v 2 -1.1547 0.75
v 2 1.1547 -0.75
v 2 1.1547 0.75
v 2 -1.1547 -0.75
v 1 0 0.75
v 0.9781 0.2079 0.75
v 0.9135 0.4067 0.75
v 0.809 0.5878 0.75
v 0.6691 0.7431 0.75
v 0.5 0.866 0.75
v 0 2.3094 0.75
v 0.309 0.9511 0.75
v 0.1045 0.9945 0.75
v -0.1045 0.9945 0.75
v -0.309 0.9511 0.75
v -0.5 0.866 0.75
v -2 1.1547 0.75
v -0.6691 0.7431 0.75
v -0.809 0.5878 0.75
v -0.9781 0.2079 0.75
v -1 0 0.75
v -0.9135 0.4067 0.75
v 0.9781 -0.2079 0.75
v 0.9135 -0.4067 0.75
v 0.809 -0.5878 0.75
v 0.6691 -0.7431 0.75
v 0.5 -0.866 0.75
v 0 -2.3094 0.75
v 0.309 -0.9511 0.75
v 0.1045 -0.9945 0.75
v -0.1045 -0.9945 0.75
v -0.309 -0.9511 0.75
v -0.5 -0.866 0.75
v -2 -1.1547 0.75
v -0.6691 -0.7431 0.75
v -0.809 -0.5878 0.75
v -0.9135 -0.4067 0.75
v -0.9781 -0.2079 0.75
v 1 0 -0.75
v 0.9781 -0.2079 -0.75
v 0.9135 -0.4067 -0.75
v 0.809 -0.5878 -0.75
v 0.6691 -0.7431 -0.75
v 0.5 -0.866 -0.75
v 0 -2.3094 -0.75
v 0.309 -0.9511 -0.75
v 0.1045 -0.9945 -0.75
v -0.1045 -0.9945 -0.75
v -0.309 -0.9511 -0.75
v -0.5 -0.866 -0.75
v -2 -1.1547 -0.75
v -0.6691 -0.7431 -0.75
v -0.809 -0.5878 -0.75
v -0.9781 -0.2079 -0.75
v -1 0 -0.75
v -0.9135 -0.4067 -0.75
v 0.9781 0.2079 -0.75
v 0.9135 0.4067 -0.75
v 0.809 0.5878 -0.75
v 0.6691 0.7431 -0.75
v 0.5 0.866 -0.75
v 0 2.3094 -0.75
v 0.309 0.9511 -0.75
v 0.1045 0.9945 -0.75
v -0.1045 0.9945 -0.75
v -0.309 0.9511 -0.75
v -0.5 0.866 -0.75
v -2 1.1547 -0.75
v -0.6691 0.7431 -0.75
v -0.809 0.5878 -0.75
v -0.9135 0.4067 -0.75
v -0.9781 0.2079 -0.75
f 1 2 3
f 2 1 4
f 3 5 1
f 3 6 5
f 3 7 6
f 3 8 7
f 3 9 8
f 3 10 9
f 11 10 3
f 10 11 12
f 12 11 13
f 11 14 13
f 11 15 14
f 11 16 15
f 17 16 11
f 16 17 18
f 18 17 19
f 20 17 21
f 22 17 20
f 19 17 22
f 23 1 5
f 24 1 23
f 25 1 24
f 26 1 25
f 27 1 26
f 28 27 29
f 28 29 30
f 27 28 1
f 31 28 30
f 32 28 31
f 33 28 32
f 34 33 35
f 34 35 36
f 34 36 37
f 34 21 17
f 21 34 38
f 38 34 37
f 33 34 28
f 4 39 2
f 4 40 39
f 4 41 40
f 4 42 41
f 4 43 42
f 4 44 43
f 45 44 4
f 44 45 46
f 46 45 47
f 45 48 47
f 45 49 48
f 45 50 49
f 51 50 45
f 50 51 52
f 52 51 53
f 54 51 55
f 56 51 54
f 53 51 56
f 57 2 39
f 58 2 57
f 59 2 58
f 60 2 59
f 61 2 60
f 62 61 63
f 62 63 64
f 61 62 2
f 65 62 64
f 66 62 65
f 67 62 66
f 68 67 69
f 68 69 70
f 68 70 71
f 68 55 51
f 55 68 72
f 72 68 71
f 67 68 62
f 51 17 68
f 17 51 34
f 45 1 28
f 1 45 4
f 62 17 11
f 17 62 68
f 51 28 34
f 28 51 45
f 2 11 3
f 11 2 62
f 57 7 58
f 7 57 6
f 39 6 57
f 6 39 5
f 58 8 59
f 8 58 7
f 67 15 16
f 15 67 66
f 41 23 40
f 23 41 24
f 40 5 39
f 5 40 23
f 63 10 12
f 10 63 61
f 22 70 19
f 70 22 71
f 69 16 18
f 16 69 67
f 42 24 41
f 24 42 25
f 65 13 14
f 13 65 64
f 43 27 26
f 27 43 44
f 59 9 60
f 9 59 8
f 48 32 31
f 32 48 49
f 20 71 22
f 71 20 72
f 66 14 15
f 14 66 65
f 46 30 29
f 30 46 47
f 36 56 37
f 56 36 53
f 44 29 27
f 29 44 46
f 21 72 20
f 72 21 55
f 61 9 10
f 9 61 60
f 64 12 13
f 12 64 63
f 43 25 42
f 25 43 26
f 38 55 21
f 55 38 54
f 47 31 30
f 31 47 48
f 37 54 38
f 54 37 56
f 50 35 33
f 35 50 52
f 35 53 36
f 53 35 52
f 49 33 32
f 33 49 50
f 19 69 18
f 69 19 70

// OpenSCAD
// file: settings.scad
// Common settings used by all scad files.

// ALL UNITS IN MILLIMETERS (MM)!!!

$fn = 30;//low-res but fast to render
//$fn = 50;//higher-res but slow to render

pi = 3.1415926535897932384626433832795;

max_footprint = 150; // 15x15 cm

bottom_clearance = 10;
bottom_clearance = 25.4/2+10;
//bottom_clearance = 30;

shell_alpha = 0.215;
//shell_alpha = 1.0;

tolerance = 0.5;

// Flat countersunk M2.5mm x 0.45mm machine screw.
screw_thread_diameter = 2.5;//2.8;//2.75;//2.4?
screw_thread_length = 5;//?
screw_head_diameter = 4.75; // M2.5
//screw_head_diameter = 5.2; // M3
screw_head_height = 1.5;//2;

screw_thread_diameter2 = 2;

unit_thickness = 5;
u = unit_thickness;

shell_thickness = unit_thickness;

// Show flags.
show_platform = 0;
show_head = 1;
show_head_shell = 0;
show_head_electronics_bb = 0;
show_battery = 1;
show_foot_cube = 0;
show_torso = 0;
show_motor = 0;
show_motor_plates = 1;
show_motor_inner_plates = 1;
show_motor_outer_plates = 1;
show_wheel = 0;//obsolete
show_tracks = 1;//
show_track_wheels = 1;
show_caster = 0;
show_rpi = 1;
show_vertical_plates = 1;//
show_horizontal_plates = 1;//
show_caster_plates = 0;//obsolete?
show_camera = 1;
show_screen = 0;
show_edge_mount = 1;
show_sonar_mount = 1;
show_recharge_mount = 1;
show_conduit = 1;
show_torso_shell = 1;
show_recharge_dock = 0;
show_head_tilt_axis = 0;
show_rpi_camera_axis = 0;
show_laser_axis = 0;

head_vertical_angle_tilt = 0;
//head_vertical_angle_tilt = 30;//max
//head_vertical_angle_tilt = 10;

torso_height = 120+20;

base_plate_diameter = max_footprint-unit_thickness*2;
base_plate_frame = 0;

head_height = 50;
head_offset_z = max_footprint/2;
head_middle_cutout = 85;

rpi_with_four_hats_and_clearance = 76;

qrd1114_w = 6.10;
qrd1114_l = 4.39;
qrd1114_h = 4.65;

dock_radius = 10;
dock_gripper_border = 2;
dock_gripper_instep = 0.9;
dock_gripper_cutout_tapper = 50;
dock_receiver_height = 5;

// Patriod Fuel+ 9000 mAh
battery_length = 90;
battery_width = 57;
battery_height = 23;
battery_offset_z = 30;//4;

wheel_diameter = 50;
wheel_offset_x = 65;
wheel_offset_z = wheel_diameter/2;
wheel_axle_diameter = 5;

//caster_diameter = 19.05; // 0.75 inches
caster_diameter = 25.45; // 1 inches
//caster_diameter = 15.875; // 5/8 inches
caster_holder_diameter = 30;//31;
caster_offset_y = base_plate_diameter/2 - caster_holder_diameter/2;

arduino_offset_x = 0;
arduino_offset_y = 0;
arduino_offset_z = 67;
arduino_offset_x2 = 0;
arduino_offset_y2 = -20;
arduino_offset_z2 = torso_height+bottom_clearance;

horizontal_plate_width = unit_thickness*8*2 - unit_thickness*2;
horizontal_plate_depth = unit_thickness*8*2;

vertical_plate_width = horizontal_plate_depth;
vertical_plate_height = unit_thickness*8;
vertical_plate_offset_x = wheel_offset_x-22.5;
vertical_plate_offset_z = vertical_plate_height/2 + unit_thickness/2;

vertical_battery_plate_height = 100 - 15;

caster_plate_width = horizontal_plate_width + unit_thickness*2;
caster_plate_mount_length = unit_thickness*4;
caster_plate_width_minor = caster_holder_diameter;

motor_switch_length = 20;
motor_switch_thickness = 6.5;
motor_switch_height = 11;
motor_switch_height_leads = 23;
motor_switch_on_height =  13.3;
motor_switch_hole_diameter = 2.5;
motor_switch_hole_offset_z = 6.5;//this plus diameter/2 is hole center from switch top
motor_switch_hole_spacing = 7.1;// holes are diameter/2 from this

motor_length = 60;
motor_width = 25;
motor_collar_width = 7;
motor_collar_height = 2.5;
motor_axle_width = 4;
motor_axle_height = 9.5;
motor_offset_x = 10;
//motor_offset_y = motor_width/2+5;
motor_offset_y = unit_thickness*3.5;
motor_offset_z = vertical_plate_height/2 - unit_thickness/2;//4;//30;
motor_mount_holes_dist = 17;
// motor countersink hole
motor_mount_holes_width = 3; // M3
motor_mount_holes_head_height = 2.2;
motor_mount_holes_head_width = 5.8;
motor_bearing_outer_diameter = 10;
motor_bearing_inner_diameter = 5.95;
motor_bearing_thickness = 2.5;

motor_unimount_idler_axle_d = screw_thread_diameter;
//motor_unimount_spacer_depth = 0.1;//too small
motor_unimount_spacer_depth = 0.5;

motor_arm_offset_y = -u*3;
motor_arm_offset_z = u*.5;

motor_plate_width = vertical_plate_width;
motor_plate_height = vertical_plate_height;
motor_plate_thickness = unit_thickness;
motor_plate_offset_z = vertical_plate_offset_z;

motor_plate_middle_thickness = 5;

wheel_hub_offset = u*3;

motor_hole_height_offset = -5;

nylon_spacer_outer_diameter = 6.35;
nylon_spacer_inner_diameter = 3.302;
nylon_spacer_length = 12.7;

track_width = unit_thickness*3;
track_offset_x = -50;
track_offset_z = .1;
//track_wheel_radius = 19;//original
track_wheel_radius = 14;
//track_wheel_hole_radius = (nylon_spacer_outer_diameter+1)/2;
track_wheel_hole_radius = motor_bearing_outer_diameter/2;

track_driver_hole_radius = (motor_axle_width)/2 + 0.1;
track_driver_set_screw_head_d = 4.1;
track_driver_set_screw_shaft_d = 2.4;
//track_wheel_width = 13.5;//original
track_wheel_width = u*2;
track_wheel_width_buffer = u*0.25;
track_offset = 3;        //distance from chassis
track_wheel_offset = track_offset;
//track_length = 250; // see tread_triangle.py, too big
//track_length = 240; // see tread_triangle.py
//track_length = 238; //inc/dec in 10 unit increments so notches match idlers
track_length = 228; //inc/dec in 10 unit increments so notches match idlers
track_radius = track_length/2/pi;
track_wheel_show_fancy = 1;
track_wheel_gap = track_wheel_width + track_wheel_width_buffer*2;
track_axle_bearing_diameter = motor_bearing_inner_diameter - 0.1;
track_tensioner_radius = 12;
track_nut_height = 3.5; //TODO
track_punchout_thickness = 0.25;//should be the same as the minimum layer thickness

head_slew_bearing_outer_diameter = 115;
head_slew_bearing_ring_thickness = 20;
head_slew_bearing_inner_diameter = head_slew_bearing_outer_diameter - head_slew_bearing_ring_thickness;
//head_slew_bearing_hole_diameter = head_slew_bearing_inner_diameter - head_slew_bearing_ring_thickness;
head_slew_bearing_hole_diameter = 12+tolerance; // slip ring https://www.adafruit.com/products/775
//head_slew_bearing_ball_diameter = 5;
head_slew_bearing_ball_diameter = 2.5; //u/2;
head_slew_bearing_height = u;//head_slew_bearing_ball_diameter*2;
head_slew_bearing_gap = 0.5;
head_slew_bearing_slew_gap = 0;
head_slew_bearing_gap_factor = 0.1;

neck_strut_width = u*7;
neck_strut_height = u*18;
neck_strut_spacing = u*8;

show_outer_race = 0;
show_inner_race_a = 1;
show_inner_race_b = 1;
show_balls = 0;
// main file
include <settings.scad>;

module make_hex_nut(w, h, d=0){
    // d = inner diameter
    // w = width across the flats
    // h = height or thickness
    s = w/sqrt(3);
    difference(){
        union(){
            for(i=[0:1:2]){
                rotate([0,0,120*i])
                cube([w, s, h], center=true);
            }
        }
        if(d){
            cylinder(d=d, h=h+1, center=true);
        }
    }
}

//make_hex_nut(w=5, h=2, d=2.5);

module make_nut_2(d=2){
    make_hex_nut(w=4.8, h=2, d=d);
}

module make_nut_w4_h1p5(d=2){
    make_hex_nut(w=4, h=1.5, d=d);
}

module make_nut_2_5(d=2, h=3.5){
    make_hex_nut(w=5+tolerance/2, h=h, d=d);
}

module make_nut_2_5_test(){
    difference(){
        translate([0,0,-.5])
        cube([10,10,2], center=true);
        make_nut_2_5(d=0);
    }
}

module make_nut_2_5_test_downward(){
    difference(){
        translate([0,0,1])
        cube([10,10,2*2.5], center=true);
        color("red")
        make_nut_2_5(d=0);
        color("blue")
        cylinder(d=screw_thread_diameter, h=10, center=true);
    }
}

module make_nut_2_5_test_punchout(){
    difference(){
        translate([0,0,1.5])
        cube([10,10,2*1.5], center=true);
        color("red")
        make_nut_2_5(d=0);
        color("blue")
        cylinder(d=screw_thread_diameter, h=10, center=true);
    }
    color("green")
    translate([0,0,1.8])
    cube([10,10,track_punchout_thickness], center=true);
}

//make_nut_2_5_test();
make_nut_w4_h1p5();
//make_nut_2_5_test_downward();
//make_nut_2_5_test_punchout();
